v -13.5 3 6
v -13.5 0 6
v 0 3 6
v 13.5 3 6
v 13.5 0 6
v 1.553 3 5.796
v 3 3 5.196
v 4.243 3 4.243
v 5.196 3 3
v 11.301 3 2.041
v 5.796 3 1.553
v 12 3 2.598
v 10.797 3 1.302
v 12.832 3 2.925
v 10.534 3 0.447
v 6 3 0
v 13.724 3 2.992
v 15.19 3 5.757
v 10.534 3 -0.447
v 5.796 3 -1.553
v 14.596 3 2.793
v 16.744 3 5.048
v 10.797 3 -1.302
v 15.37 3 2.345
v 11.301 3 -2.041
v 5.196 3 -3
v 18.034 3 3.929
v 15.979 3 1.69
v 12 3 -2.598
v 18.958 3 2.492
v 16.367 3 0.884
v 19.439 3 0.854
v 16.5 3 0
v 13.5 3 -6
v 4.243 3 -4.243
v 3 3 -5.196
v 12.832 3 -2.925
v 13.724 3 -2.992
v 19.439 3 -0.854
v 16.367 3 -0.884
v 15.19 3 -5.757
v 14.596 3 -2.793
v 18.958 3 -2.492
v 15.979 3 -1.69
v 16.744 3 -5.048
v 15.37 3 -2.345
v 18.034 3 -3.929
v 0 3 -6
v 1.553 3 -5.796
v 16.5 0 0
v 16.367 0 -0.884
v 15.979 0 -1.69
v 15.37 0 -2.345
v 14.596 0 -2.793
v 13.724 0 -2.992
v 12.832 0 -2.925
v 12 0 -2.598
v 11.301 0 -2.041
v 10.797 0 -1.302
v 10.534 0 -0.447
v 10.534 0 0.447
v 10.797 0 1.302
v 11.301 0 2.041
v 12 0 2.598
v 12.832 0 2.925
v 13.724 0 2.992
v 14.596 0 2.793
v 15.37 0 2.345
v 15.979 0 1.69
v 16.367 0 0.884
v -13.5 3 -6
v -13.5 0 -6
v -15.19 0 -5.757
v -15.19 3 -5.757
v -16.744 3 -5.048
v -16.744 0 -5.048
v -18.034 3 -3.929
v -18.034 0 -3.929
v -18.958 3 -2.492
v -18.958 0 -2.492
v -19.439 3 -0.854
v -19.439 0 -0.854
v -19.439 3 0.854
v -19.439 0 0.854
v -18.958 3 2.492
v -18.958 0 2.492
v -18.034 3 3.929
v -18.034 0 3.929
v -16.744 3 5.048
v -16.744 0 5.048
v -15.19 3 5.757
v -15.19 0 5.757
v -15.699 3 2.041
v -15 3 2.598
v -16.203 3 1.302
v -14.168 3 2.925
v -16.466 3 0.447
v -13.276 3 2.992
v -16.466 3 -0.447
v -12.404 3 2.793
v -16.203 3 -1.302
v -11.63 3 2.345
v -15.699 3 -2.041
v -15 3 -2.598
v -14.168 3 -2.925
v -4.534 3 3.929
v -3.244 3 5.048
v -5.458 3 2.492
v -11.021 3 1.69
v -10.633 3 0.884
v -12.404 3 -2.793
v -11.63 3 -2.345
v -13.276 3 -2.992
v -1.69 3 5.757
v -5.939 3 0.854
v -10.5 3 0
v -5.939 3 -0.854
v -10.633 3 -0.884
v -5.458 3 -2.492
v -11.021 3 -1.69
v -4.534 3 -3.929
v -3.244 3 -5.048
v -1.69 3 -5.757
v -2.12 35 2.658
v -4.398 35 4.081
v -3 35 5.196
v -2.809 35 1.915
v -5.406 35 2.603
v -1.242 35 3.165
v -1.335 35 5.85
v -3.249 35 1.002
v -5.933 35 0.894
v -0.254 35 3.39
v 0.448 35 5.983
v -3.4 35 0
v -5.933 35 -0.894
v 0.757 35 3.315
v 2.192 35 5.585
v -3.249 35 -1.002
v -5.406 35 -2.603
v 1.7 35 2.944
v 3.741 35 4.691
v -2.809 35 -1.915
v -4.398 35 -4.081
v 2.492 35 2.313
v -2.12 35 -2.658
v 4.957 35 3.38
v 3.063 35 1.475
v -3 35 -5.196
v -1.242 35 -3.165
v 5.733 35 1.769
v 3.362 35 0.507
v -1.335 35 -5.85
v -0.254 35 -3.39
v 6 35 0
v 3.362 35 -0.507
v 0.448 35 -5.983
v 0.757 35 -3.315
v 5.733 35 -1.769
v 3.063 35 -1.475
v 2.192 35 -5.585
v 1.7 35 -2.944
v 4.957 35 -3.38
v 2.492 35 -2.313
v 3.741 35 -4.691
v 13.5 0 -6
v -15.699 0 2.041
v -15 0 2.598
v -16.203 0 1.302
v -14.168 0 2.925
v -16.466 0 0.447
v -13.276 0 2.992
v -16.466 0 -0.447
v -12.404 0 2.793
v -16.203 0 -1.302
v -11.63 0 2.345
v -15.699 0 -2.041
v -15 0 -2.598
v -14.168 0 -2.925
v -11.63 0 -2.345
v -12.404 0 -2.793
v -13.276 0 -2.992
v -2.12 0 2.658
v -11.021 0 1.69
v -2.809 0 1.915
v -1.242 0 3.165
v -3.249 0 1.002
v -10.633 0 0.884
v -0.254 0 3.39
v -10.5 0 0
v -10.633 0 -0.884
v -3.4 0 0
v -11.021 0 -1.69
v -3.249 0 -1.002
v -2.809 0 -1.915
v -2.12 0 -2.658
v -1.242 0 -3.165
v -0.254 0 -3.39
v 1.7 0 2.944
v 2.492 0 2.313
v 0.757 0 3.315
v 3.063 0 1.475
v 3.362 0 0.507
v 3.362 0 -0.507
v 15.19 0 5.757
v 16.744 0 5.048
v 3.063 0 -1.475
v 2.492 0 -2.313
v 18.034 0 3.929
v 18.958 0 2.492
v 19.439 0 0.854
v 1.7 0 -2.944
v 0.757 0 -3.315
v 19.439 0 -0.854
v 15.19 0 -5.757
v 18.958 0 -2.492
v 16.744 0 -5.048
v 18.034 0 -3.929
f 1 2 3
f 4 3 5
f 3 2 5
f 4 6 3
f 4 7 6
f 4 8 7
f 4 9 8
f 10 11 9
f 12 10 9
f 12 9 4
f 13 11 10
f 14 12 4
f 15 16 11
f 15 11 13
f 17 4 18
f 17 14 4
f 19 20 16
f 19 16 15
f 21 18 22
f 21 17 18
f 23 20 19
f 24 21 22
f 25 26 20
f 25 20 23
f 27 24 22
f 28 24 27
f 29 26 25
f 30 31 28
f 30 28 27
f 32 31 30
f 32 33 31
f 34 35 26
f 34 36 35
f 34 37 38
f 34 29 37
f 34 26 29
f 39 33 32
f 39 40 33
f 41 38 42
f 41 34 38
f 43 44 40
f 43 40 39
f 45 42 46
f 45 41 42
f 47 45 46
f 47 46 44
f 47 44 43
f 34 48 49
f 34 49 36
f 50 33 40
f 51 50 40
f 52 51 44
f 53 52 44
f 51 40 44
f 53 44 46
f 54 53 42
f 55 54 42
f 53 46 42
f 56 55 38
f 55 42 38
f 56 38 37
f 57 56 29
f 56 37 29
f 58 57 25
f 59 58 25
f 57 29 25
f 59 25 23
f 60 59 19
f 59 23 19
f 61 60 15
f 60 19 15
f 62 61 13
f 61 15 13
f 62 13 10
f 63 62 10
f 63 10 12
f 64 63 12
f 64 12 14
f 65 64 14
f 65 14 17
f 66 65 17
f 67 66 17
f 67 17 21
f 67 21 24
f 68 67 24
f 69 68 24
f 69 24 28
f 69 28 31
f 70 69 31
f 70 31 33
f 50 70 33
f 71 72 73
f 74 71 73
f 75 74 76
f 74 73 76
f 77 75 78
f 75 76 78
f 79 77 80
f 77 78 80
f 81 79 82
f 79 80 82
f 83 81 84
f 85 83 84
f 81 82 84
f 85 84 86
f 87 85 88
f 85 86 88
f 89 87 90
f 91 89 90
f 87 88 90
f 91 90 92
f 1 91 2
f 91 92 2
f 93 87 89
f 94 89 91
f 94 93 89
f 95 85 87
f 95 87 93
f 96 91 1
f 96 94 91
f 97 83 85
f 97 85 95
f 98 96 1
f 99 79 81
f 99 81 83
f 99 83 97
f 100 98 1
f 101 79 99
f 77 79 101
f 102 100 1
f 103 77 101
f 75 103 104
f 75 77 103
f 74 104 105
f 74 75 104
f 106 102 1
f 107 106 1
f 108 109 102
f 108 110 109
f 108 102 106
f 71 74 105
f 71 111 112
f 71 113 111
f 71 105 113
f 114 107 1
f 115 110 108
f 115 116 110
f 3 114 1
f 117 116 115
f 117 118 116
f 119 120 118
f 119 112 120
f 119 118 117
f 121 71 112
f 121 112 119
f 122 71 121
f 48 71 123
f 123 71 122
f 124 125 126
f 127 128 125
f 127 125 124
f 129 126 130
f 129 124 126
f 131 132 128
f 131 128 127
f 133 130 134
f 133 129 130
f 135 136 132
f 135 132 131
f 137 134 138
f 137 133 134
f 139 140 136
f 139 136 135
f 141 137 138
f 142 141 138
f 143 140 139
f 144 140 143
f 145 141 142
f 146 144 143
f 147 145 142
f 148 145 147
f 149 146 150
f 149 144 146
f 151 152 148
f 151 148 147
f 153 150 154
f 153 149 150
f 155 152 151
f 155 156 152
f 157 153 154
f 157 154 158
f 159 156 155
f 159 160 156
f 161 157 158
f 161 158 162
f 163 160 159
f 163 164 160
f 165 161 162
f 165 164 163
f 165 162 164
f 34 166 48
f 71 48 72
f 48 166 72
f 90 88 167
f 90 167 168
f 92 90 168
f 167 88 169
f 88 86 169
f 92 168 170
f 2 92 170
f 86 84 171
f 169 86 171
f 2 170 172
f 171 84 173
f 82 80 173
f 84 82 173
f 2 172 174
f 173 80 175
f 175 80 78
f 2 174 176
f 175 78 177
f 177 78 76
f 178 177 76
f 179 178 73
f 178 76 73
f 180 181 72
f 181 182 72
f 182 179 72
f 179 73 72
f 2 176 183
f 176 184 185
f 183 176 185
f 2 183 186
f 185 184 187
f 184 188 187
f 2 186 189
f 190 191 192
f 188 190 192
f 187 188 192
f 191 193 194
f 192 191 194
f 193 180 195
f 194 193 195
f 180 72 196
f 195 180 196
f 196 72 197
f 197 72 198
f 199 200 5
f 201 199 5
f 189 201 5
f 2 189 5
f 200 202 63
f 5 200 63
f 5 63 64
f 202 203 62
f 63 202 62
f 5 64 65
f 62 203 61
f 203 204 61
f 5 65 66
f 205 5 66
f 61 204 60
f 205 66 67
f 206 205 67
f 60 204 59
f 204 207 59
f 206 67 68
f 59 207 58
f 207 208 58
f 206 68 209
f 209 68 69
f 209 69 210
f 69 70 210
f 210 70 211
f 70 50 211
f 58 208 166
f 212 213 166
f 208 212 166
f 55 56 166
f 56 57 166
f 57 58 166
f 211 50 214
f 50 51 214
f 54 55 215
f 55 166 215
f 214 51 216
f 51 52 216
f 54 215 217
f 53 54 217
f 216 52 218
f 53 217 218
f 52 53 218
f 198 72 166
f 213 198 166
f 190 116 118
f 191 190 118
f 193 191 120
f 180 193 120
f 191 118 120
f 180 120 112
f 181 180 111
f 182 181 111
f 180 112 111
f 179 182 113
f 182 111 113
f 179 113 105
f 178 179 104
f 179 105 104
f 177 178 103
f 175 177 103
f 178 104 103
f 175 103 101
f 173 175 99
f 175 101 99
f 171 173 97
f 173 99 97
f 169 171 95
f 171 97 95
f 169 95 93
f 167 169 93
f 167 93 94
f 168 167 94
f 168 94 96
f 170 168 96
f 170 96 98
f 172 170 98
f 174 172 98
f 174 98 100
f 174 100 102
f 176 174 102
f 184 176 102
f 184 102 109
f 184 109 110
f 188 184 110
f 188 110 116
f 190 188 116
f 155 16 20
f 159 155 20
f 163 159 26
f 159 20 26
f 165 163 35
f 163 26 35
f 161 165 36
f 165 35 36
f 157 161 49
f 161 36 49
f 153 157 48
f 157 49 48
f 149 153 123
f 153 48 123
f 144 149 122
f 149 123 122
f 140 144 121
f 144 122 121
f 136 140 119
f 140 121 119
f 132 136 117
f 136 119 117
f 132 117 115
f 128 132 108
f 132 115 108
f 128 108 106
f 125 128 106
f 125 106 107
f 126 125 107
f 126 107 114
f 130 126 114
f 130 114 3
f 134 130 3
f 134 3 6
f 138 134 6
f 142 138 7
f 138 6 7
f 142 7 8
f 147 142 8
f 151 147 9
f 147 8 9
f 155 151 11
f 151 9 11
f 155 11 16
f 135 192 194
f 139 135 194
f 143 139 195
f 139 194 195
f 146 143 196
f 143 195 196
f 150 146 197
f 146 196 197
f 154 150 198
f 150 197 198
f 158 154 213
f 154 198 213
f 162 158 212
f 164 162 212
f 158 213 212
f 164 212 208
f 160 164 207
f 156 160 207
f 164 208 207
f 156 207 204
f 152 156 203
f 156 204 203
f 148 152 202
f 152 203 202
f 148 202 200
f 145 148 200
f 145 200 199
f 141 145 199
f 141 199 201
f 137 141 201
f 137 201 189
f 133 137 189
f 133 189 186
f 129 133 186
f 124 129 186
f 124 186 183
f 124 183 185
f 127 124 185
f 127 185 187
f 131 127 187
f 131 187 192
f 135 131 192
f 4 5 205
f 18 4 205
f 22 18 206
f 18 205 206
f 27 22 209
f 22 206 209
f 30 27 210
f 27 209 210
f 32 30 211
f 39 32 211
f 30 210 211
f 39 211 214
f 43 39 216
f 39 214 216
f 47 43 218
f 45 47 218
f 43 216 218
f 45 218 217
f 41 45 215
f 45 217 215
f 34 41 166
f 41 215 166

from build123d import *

# Parameters (mm, degrees)
SKETCH_1_R          = 6
EXTRUDE_1_DEPTH     = 3
SKETCH_2_R          = 6
EXTRUDE_2_DEPTH     = 32
HOLE_WIZARD_M8_1_D  = 6.8
SKETCH_6_R          = 3
CUT_EXTRUDE_1_DEPTH = 10


with BuildPart() as part:
    # 草图1 → 凸台-拉伸1 (new body)
    with BuildSketch(Plane(origin=(0, 0, 0), x_dir=(1, 0, 0), z_dir=(0, 1, 0))):
        with Locations((-13.5, 0)):
            Circle(SKETCH_1_R)
        with BuildLine():
            Line((13.5, 6), (-13.5, 6))
            ThreePointArc((-13.5, 6), (-9.257359313, 4.242640687), (-7.5, 0))
            ThreePointArc((-7.5, 0), (-9.257359313, -4.242640687), (-13.5, -6))
            Line((-13.5, -6), (13.5, -6))
            ThreePointArc((13.5, -6), (7.5, 0), (13.5, 6))
        make_face()
        with Locations((13.5, 0)):
            Circle(SKETCH_1_R)
    extrude(amount=EXTRUDE_1_DEPTH)

    # 草图2 → 凸台-拉伸2 (add)
    with BuildSketch(Plane(origin=(0, 3, 0), x_dir=(1, 0, 0), z_dir=(0, 1, 0))):
        Circle(SKETCH_2_R)
    extrude(amount=EXTRUDE_2_DEPTH)

    # M8 螺纹孔1 (through all)
    with Locations(Plane(origin=(0, 35, 0), x_dir=(1, 0, 0), z_dir=(0, 1, 0))):
        with Locations((0, 0)):
            Hole(HOLE_WIZARD_M8_1_D / 2)

    # 草图6 → 切除-拉伸1 (cut)
    with BuildSketch(Plane(origin=(0, 3, 0), x_dir=(1, 0, 0), z_dir=(0, 1, 0))):
        with Locations((-13.5, 0)):
            Circle(SKETCH_6_R)
        with Locations((13.5, 0)):
            Circle(SKETCH_6_R)
    extrude(amount=-CUT_EXTRUDE_1_DEPTH, mode=Mode.SUBTRACT)


solid = part.part
